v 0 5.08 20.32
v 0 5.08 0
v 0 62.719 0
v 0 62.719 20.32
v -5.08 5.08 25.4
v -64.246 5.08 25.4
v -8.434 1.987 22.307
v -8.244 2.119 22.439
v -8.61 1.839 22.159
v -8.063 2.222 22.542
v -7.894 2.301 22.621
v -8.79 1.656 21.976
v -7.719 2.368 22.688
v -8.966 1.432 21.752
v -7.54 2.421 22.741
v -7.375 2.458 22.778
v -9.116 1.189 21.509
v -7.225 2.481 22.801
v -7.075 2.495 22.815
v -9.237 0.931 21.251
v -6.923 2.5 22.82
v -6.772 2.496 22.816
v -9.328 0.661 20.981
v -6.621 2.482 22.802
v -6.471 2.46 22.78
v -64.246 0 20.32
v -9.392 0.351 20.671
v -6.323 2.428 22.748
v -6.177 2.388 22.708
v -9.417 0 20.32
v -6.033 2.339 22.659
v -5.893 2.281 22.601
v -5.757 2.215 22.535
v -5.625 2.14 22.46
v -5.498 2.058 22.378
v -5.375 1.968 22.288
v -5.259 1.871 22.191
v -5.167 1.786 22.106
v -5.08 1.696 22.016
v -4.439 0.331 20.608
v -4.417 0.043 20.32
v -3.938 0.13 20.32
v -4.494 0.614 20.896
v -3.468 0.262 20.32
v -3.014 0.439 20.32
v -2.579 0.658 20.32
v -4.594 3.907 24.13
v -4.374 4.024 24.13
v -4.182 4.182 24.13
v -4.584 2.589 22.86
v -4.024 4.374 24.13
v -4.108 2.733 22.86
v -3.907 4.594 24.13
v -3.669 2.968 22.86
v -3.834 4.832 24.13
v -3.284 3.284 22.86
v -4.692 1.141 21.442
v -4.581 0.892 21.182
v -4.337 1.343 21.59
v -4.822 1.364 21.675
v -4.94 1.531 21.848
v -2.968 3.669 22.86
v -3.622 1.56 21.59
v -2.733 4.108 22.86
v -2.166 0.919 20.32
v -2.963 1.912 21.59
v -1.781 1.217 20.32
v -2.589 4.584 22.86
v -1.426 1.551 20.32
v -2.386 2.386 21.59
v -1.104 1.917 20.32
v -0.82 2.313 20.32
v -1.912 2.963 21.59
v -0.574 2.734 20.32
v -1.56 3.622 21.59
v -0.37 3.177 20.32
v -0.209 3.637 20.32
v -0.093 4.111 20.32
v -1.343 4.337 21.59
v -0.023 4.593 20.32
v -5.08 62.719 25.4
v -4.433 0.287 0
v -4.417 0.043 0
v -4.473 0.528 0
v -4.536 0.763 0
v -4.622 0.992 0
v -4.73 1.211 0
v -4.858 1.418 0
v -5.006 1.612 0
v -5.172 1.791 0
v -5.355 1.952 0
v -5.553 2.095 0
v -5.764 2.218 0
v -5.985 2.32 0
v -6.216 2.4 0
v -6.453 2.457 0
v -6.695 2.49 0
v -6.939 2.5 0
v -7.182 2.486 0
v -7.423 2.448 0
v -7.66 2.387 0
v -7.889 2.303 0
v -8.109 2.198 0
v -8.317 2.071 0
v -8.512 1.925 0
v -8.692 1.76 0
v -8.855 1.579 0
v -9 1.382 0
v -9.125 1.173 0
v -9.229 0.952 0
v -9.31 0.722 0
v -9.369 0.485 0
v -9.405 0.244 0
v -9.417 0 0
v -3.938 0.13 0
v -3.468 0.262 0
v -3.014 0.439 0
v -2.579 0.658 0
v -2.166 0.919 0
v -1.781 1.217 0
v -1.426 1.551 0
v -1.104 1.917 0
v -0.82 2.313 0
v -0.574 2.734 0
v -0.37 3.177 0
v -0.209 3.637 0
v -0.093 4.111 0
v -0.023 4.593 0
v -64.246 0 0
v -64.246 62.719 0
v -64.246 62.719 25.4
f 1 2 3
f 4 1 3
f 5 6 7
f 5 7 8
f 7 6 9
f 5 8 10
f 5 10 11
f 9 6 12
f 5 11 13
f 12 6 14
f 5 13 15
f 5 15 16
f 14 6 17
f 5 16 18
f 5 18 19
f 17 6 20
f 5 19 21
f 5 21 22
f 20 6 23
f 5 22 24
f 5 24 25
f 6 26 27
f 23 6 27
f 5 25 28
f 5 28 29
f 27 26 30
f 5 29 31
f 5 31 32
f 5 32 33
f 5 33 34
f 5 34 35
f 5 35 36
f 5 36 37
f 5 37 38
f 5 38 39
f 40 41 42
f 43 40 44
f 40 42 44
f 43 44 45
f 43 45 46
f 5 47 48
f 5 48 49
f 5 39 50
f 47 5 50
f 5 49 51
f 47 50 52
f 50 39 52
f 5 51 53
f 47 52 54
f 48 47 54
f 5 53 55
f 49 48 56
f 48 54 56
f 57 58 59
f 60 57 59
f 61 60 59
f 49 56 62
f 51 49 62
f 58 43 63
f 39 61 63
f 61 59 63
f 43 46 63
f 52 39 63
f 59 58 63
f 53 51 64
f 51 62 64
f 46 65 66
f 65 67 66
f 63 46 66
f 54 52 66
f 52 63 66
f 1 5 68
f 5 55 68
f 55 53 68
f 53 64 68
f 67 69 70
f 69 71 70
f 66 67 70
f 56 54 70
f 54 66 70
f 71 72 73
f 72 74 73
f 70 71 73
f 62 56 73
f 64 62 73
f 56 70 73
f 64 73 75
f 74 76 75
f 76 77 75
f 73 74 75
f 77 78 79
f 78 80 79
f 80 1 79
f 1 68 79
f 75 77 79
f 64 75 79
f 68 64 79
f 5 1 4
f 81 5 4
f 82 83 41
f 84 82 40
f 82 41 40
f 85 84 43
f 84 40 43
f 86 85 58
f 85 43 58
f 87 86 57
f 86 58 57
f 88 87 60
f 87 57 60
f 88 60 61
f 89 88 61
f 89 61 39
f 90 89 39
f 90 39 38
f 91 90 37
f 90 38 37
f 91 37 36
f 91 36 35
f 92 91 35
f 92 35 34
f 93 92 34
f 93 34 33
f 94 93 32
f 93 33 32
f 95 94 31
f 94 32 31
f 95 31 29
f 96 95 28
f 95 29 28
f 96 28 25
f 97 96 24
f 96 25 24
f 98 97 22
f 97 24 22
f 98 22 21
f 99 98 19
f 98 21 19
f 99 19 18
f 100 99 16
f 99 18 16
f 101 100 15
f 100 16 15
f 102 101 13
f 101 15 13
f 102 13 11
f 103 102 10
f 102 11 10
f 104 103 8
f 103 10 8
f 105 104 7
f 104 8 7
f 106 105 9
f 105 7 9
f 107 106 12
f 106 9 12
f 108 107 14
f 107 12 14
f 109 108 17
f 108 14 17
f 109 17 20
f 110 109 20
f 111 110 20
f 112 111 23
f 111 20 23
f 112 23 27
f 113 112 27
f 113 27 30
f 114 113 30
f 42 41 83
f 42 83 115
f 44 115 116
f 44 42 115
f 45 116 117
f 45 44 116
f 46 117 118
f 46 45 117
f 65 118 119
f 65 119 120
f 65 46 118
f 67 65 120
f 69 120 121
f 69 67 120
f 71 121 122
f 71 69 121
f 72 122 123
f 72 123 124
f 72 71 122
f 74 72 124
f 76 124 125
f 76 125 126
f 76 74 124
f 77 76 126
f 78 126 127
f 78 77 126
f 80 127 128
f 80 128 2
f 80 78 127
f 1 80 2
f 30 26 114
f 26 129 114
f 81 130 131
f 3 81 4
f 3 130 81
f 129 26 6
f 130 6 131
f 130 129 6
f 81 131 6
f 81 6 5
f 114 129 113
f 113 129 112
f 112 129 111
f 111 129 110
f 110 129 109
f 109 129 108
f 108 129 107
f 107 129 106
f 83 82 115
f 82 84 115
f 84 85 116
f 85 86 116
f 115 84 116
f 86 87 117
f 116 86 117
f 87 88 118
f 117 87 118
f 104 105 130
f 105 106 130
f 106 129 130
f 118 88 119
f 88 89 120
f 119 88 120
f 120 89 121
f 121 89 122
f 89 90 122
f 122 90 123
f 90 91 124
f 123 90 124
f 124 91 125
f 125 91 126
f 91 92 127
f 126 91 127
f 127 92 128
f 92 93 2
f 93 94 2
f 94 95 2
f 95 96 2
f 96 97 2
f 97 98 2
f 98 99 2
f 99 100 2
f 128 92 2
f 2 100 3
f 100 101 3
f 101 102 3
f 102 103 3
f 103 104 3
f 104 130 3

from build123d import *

# Parameters (mm, degrees)
F0_W     = 64.246036
F0_H     = 62.718913
F2_DEPTH = 25.4
F3_R     = 5.08
F4_SIZE  = 5.08
F5_D     = 5


with BuildPart() as f2:
    # F0 (on Top) → F2 (new body)
    with BuildSketch(Plane.XY):
        with Locations((-32.123018, 31.359457)):
            Rectangle(F0_W, F0_H)
    extrude(amount=F2_DEPTH)

    # F3
    f3_edges = [f2.edges().sort_by_distance(p)[0] for p in [
        (0, 0, 12.7),
    ]]
    fillet(f3_edges, radius=F3_R)

    # F4
    f4_edges = [f2.edges().sort_by_distance(p)[0] for p in [
        (0, 33.899456, 25.4),
    ]]
    chamfer(f4_edges, length=F4_SIZE)

    # F5 (through all)
    with Locations(Plane(origin=(0, 0, 0), x_dir=(1, 0, 0), z_dir=(0, 0, -1))):
        with Locations((-6.916952, 0)):
            Hole(F5_D / 2)


solid = f2.part
